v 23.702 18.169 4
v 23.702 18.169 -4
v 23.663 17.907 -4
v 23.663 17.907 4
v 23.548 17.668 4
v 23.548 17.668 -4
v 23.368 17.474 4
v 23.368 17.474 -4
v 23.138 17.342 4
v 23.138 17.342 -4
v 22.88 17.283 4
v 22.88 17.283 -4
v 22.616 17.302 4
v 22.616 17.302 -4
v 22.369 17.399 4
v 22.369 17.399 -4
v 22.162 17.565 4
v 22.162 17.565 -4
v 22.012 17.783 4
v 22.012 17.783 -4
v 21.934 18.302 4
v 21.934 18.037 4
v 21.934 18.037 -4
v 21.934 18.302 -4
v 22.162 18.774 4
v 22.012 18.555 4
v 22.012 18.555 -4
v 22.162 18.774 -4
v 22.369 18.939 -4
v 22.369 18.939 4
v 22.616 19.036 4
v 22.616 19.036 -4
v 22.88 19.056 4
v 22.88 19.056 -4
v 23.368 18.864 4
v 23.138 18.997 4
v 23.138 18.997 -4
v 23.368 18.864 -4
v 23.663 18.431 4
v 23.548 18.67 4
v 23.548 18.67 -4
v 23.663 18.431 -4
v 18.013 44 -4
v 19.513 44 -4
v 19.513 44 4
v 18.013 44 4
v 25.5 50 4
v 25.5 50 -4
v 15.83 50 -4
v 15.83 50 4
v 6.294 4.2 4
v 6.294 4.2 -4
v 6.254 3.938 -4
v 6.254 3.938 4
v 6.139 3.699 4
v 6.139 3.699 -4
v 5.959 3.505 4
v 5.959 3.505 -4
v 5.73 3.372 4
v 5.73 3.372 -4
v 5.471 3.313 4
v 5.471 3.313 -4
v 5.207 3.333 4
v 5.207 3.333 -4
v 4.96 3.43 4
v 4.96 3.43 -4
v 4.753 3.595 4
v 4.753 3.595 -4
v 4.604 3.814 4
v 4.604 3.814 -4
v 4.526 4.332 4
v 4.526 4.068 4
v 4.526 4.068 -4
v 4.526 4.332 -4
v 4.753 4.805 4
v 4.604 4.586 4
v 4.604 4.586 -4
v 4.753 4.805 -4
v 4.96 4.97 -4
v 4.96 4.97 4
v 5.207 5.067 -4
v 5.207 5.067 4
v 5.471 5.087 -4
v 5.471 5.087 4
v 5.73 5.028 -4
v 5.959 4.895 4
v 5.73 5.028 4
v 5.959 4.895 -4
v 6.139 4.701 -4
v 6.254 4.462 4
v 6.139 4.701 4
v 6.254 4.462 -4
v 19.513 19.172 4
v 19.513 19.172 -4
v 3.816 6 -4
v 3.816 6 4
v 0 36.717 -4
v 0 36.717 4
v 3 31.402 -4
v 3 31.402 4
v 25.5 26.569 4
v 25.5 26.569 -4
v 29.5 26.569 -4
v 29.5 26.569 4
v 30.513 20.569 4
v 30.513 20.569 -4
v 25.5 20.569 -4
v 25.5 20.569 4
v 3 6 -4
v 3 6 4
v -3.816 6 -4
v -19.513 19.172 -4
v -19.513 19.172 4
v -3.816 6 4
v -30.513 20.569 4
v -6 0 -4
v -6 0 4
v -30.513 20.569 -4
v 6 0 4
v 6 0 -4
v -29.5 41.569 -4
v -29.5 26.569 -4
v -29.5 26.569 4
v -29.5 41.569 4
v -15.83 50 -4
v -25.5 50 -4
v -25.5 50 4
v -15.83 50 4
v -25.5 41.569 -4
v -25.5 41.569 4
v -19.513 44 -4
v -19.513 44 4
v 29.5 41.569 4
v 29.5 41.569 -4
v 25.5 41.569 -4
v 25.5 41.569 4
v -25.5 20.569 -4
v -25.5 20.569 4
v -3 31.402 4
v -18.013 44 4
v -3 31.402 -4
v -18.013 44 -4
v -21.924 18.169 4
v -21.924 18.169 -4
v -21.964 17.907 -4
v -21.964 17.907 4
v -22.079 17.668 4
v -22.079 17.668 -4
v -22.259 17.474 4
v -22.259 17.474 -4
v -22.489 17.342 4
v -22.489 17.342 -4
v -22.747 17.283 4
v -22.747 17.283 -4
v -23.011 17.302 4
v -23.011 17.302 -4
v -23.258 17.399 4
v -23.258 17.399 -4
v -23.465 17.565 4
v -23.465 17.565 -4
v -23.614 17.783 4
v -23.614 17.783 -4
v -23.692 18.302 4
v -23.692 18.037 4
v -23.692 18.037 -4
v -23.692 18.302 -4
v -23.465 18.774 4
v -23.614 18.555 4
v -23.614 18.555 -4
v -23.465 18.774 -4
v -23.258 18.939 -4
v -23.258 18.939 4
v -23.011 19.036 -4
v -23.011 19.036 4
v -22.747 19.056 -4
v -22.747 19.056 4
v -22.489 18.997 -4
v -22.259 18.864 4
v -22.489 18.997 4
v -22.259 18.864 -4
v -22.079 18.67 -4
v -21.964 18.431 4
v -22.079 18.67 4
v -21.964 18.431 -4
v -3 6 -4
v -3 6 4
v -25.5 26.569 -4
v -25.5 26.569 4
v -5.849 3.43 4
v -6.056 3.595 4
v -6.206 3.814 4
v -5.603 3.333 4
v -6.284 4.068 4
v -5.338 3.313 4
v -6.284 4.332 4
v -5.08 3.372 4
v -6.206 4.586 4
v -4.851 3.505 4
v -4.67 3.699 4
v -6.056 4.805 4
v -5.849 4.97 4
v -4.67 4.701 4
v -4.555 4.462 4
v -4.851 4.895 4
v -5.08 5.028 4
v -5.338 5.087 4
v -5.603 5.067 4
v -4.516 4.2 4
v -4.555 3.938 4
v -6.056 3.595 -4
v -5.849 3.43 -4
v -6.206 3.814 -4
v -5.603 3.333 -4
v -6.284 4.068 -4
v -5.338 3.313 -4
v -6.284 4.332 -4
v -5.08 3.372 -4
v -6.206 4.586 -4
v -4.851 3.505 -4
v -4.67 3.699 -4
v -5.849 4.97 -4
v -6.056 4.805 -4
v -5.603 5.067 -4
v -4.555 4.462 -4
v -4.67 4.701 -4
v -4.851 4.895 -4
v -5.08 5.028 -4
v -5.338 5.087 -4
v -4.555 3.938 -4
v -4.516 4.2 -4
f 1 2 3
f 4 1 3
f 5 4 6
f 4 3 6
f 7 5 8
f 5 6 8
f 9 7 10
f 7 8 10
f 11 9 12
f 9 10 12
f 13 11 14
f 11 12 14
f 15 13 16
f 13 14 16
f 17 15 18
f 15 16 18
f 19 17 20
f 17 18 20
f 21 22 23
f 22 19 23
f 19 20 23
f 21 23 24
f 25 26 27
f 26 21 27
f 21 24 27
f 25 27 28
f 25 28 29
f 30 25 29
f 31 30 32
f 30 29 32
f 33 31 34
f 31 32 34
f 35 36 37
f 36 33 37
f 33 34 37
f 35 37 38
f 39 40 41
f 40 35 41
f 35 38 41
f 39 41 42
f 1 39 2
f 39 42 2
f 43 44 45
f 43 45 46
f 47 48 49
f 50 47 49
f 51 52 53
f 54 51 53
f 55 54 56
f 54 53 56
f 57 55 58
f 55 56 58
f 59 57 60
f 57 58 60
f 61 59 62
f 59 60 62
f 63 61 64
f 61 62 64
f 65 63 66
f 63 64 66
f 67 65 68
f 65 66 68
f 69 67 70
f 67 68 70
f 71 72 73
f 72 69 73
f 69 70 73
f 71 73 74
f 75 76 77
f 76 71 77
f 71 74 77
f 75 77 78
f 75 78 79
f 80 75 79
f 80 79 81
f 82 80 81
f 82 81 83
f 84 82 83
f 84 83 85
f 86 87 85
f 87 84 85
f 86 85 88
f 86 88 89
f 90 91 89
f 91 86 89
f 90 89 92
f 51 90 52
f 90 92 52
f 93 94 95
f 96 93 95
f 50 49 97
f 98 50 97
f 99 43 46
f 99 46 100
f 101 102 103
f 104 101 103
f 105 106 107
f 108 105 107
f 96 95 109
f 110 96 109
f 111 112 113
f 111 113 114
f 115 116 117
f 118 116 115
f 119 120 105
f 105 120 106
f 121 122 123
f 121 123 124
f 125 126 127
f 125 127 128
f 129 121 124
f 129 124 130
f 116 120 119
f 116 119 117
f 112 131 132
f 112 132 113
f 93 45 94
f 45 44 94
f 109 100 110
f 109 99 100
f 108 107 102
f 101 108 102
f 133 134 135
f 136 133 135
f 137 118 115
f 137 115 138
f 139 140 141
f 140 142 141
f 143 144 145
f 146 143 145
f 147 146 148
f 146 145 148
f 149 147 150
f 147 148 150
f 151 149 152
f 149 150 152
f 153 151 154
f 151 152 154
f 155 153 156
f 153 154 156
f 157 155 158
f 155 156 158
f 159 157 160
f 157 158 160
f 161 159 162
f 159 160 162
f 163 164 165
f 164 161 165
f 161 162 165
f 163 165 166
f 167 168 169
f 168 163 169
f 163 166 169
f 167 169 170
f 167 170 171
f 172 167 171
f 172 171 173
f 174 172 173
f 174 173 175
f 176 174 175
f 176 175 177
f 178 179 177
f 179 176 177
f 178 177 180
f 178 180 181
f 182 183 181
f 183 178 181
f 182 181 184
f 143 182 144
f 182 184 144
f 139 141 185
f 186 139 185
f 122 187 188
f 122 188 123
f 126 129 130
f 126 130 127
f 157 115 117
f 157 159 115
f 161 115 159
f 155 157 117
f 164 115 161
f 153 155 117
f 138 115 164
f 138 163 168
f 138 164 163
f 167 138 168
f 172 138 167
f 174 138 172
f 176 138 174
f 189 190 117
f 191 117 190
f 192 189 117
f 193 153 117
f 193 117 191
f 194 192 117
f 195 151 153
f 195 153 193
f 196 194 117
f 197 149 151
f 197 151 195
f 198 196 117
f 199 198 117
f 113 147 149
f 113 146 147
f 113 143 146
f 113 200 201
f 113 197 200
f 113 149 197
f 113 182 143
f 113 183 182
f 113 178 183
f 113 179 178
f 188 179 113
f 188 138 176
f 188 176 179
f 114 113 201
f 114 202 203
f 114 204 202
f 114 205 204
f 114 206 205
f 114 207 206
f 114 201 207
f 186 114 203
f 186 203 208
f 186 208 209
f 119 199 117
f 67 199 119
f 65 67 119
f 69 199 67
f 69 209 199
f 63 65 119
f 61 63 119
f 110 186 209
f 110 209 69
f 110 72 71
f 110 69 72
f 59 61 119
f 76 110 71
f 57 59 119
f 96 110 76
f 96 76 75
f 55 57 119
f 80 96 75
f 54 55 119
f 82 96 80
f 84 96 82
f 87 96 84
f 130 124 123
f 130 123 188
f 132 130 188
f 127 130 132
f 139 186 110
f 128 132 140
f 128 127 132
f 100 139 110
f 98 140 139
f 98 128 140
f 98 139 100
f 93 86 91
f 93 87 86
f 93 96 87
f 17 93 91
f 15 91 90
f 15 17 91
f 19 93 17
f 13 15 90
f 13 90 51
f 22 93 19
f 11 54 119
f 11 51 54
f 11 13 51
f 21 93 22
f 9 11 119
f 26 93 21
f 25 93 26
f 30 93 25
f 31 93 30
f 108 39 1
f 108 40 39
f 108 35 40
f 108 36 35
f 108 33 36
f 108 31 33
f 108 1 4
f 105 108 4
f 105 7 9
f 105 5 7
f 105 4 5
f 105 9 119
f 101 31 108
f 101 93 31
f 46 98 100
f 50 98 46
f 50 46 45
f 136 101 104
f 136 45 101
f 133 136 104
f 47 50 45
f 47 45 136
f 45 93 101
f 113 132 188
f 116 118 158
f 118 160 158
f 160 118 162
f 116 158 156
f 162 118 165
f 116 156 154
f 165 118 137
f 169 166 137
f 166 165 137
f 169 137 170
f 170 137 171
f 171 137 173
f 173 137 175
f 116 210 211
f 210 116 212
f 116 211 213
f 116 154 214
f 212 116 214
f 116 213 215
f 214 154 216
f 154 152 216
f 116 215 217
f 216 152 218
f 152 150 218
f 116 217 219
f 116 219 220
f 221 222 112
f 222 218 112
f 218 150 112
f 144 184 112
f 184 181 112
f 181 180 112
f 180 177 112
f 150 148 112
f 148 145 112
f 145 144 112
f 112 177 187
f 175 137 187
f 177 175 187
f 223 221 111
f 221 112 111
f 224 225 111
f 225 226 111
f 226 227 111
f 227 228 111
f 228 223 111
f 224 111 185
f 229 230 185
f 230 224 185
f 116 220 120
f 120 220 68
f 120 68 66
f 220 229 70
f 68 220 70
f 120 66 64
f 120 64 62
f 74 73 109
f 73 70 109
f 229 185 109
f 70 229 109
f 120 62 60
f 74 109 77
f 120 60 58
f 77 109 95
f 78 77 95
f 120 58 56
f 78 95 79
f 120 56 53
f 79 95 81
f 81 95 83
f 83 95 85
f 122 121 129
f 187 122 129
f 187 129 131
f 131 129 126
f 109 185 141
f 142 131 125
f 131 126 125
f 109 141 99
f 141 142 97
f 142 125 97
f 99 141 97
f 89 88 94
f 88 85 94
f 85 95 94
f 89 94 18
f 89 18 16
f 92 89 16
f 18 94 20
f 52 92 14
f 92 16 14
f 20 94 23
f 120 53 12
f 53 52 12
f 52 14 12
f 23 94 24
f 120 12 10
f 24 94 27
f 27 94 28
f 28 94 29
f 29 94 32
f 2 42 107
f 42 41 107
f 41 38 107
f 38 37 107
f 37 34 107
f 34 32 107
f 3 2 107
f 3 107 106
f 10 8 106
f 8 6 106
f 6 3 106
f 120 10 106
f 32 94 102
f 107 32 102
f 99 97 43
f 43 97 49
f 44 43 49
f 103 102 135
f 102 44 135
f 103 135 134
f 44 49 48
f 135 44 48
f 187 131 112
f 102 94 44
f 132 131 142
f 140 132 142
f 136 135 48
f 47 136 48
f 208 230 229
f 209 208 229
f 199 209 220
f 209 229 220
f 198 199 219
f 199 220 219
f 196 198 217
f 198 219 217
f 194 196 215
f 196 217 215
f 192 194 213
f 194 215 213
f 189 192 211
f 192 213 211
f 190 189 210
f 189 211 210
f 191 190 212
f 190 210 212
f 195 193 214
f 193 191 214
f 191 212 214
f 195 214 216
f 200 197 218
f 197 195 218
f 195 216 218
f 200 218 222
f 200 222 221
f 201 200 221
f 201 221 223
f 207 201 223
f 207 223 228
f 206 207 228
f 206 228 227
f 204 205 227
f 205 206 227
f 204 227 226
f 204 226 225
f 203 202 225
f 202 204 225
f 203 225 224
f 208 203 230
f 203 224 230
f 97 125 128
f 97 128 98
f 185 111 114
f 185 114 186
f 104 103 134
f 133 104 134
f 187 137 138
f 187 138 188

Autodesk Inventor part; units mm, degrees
ref_plane "YZ Plane" through (0, 0, 0) normal (1, 0, 0) x (0, 1, 0)
ref_plane "XZ Plane" through (0, 0, 0) normal (0, 1, 0) x (-1, 0, 0)
ref_plane "XY Plane" through (0, 0, 0) normal (0, 0, 1) x (1, 0, 0)
sketch "Sketch1" plane through (0, 0, 0) normal (0, 0, 1) x (1, 0, 0)
  line L0 (0, 0) -> (-6, 0)
  line L1 (-6, 0) -> (-30.5134, 20.5692)
  line L2 (-19.5134, 44) -> (-19.5134, 19.1716)
  line L3 (-19.5134, 19.1716) -> (-3.8162, 6)
  line L4 (0, 0) -> (0, 7.1987)
  circle A0 centre (-5.4048, 4.2) radius 0.889
  circle A1 centre (-22.8134, 18.1692) radius 0.889
  line L5 (-30.5134, 20.5692) -> (-25.4999, 20.5692)
  line L6 (-25.4999, 20.5692) -> (-25.4999, 26.5692)
  line L7 (-25.4999, 26.5692) -> (-29.4999, 26.5692)
  line L8 (-29.4999, 26.5692) -> (-29.4999, 41.5692)
  line L9 (-29.4999, 41.5692) -> (-25.4999, 41.5692)
  line L10 (-25.4999, 41.5692) -> (-25.4999, 50)
  line L11 (-25.4999, 50) -> (-15.8296, 50)
  line L12 (-15.8296, 50) -> (0, 36.7174)
  line L13 (-3, 31.4022) -> (-3, 6)
  line L14 (0, 7.1987) -> (0, 36.7174)
  line L15 (-18.0134, 44) -> (-3, 31.4022)
  line L16 (-19.5134, 44) -> (-18.0134, 44)
  line L17 (-3.8162, 6) -> (-3, 6)
  line L18 (0, 0) -> (6, 0)
  circle A2 centre (5.4048, 4.2) radius 0.889
  line L19 (19.5134, 19.1716) -> (3.8162, 6)
  line L20 (19.5134, 44) -> (19.5134, 19.1716)
  line L21 (6, 0) -> (30.5134, 20.5692)
  circle A3 centre (22.8134, 18.1692) radius 0.889
  line L22 (30.5134, 20.5692) -> (25.4999, 20.5692)
  line L23 (25.4999, 20.5692) -> (25.4999, 26.5692)
  line L24 (25.4999, 26.5692) -> (29.4999, 26.5692)
  line L25 (29.4999, 26.5692) -> (29.4999, 41.5692)
  line L26 (29.4999, 41.5692) -> (25.4999, 41.5692)
  line L27 (25.4999, 41.5692) -> (25.4999, 50)
  line L28 (25.4999, 50) -> (15.8296, 50)
  line L29 (15.8296, 50) -> (0, 36.7174)
  line L30 (3, 31.4022) -> (3, 6)
  line L31 (18.0134, 44) -> (3, 31.4022)
  line L32 (19.5134, 44) -> (18.0134, 44)
  line L33 (3.8162, 6) -> (3, 6)
  dimension "d0" = 6
  dimension "d2" = 40
  dimension "d5" = 1.778
  dimension "d6" = 32
  dimension "d8" = 3.3
  dimension "d9" = 2.4
  dimension "d10" = 4.2
  dimension "d11" = 6
  dimension "d13" = 5.0135
  dimension "d14" = 2.4
  dimension "d21" = 6
  dimension "d22" = 6
  dimension "d23" = 1.5
  dimension "d24" = 15
  dimension "d25" = 4
  dimension "d30" = 6
  dimension "d32" = 6
  dimension "d33" = 6
  dimension "d34" = 5.9865
  dimension "d35" = 50
extrude "Extrusion1" add sketch "Sketch1" along normal mid plane 8
properties part number "Leg_part2"
